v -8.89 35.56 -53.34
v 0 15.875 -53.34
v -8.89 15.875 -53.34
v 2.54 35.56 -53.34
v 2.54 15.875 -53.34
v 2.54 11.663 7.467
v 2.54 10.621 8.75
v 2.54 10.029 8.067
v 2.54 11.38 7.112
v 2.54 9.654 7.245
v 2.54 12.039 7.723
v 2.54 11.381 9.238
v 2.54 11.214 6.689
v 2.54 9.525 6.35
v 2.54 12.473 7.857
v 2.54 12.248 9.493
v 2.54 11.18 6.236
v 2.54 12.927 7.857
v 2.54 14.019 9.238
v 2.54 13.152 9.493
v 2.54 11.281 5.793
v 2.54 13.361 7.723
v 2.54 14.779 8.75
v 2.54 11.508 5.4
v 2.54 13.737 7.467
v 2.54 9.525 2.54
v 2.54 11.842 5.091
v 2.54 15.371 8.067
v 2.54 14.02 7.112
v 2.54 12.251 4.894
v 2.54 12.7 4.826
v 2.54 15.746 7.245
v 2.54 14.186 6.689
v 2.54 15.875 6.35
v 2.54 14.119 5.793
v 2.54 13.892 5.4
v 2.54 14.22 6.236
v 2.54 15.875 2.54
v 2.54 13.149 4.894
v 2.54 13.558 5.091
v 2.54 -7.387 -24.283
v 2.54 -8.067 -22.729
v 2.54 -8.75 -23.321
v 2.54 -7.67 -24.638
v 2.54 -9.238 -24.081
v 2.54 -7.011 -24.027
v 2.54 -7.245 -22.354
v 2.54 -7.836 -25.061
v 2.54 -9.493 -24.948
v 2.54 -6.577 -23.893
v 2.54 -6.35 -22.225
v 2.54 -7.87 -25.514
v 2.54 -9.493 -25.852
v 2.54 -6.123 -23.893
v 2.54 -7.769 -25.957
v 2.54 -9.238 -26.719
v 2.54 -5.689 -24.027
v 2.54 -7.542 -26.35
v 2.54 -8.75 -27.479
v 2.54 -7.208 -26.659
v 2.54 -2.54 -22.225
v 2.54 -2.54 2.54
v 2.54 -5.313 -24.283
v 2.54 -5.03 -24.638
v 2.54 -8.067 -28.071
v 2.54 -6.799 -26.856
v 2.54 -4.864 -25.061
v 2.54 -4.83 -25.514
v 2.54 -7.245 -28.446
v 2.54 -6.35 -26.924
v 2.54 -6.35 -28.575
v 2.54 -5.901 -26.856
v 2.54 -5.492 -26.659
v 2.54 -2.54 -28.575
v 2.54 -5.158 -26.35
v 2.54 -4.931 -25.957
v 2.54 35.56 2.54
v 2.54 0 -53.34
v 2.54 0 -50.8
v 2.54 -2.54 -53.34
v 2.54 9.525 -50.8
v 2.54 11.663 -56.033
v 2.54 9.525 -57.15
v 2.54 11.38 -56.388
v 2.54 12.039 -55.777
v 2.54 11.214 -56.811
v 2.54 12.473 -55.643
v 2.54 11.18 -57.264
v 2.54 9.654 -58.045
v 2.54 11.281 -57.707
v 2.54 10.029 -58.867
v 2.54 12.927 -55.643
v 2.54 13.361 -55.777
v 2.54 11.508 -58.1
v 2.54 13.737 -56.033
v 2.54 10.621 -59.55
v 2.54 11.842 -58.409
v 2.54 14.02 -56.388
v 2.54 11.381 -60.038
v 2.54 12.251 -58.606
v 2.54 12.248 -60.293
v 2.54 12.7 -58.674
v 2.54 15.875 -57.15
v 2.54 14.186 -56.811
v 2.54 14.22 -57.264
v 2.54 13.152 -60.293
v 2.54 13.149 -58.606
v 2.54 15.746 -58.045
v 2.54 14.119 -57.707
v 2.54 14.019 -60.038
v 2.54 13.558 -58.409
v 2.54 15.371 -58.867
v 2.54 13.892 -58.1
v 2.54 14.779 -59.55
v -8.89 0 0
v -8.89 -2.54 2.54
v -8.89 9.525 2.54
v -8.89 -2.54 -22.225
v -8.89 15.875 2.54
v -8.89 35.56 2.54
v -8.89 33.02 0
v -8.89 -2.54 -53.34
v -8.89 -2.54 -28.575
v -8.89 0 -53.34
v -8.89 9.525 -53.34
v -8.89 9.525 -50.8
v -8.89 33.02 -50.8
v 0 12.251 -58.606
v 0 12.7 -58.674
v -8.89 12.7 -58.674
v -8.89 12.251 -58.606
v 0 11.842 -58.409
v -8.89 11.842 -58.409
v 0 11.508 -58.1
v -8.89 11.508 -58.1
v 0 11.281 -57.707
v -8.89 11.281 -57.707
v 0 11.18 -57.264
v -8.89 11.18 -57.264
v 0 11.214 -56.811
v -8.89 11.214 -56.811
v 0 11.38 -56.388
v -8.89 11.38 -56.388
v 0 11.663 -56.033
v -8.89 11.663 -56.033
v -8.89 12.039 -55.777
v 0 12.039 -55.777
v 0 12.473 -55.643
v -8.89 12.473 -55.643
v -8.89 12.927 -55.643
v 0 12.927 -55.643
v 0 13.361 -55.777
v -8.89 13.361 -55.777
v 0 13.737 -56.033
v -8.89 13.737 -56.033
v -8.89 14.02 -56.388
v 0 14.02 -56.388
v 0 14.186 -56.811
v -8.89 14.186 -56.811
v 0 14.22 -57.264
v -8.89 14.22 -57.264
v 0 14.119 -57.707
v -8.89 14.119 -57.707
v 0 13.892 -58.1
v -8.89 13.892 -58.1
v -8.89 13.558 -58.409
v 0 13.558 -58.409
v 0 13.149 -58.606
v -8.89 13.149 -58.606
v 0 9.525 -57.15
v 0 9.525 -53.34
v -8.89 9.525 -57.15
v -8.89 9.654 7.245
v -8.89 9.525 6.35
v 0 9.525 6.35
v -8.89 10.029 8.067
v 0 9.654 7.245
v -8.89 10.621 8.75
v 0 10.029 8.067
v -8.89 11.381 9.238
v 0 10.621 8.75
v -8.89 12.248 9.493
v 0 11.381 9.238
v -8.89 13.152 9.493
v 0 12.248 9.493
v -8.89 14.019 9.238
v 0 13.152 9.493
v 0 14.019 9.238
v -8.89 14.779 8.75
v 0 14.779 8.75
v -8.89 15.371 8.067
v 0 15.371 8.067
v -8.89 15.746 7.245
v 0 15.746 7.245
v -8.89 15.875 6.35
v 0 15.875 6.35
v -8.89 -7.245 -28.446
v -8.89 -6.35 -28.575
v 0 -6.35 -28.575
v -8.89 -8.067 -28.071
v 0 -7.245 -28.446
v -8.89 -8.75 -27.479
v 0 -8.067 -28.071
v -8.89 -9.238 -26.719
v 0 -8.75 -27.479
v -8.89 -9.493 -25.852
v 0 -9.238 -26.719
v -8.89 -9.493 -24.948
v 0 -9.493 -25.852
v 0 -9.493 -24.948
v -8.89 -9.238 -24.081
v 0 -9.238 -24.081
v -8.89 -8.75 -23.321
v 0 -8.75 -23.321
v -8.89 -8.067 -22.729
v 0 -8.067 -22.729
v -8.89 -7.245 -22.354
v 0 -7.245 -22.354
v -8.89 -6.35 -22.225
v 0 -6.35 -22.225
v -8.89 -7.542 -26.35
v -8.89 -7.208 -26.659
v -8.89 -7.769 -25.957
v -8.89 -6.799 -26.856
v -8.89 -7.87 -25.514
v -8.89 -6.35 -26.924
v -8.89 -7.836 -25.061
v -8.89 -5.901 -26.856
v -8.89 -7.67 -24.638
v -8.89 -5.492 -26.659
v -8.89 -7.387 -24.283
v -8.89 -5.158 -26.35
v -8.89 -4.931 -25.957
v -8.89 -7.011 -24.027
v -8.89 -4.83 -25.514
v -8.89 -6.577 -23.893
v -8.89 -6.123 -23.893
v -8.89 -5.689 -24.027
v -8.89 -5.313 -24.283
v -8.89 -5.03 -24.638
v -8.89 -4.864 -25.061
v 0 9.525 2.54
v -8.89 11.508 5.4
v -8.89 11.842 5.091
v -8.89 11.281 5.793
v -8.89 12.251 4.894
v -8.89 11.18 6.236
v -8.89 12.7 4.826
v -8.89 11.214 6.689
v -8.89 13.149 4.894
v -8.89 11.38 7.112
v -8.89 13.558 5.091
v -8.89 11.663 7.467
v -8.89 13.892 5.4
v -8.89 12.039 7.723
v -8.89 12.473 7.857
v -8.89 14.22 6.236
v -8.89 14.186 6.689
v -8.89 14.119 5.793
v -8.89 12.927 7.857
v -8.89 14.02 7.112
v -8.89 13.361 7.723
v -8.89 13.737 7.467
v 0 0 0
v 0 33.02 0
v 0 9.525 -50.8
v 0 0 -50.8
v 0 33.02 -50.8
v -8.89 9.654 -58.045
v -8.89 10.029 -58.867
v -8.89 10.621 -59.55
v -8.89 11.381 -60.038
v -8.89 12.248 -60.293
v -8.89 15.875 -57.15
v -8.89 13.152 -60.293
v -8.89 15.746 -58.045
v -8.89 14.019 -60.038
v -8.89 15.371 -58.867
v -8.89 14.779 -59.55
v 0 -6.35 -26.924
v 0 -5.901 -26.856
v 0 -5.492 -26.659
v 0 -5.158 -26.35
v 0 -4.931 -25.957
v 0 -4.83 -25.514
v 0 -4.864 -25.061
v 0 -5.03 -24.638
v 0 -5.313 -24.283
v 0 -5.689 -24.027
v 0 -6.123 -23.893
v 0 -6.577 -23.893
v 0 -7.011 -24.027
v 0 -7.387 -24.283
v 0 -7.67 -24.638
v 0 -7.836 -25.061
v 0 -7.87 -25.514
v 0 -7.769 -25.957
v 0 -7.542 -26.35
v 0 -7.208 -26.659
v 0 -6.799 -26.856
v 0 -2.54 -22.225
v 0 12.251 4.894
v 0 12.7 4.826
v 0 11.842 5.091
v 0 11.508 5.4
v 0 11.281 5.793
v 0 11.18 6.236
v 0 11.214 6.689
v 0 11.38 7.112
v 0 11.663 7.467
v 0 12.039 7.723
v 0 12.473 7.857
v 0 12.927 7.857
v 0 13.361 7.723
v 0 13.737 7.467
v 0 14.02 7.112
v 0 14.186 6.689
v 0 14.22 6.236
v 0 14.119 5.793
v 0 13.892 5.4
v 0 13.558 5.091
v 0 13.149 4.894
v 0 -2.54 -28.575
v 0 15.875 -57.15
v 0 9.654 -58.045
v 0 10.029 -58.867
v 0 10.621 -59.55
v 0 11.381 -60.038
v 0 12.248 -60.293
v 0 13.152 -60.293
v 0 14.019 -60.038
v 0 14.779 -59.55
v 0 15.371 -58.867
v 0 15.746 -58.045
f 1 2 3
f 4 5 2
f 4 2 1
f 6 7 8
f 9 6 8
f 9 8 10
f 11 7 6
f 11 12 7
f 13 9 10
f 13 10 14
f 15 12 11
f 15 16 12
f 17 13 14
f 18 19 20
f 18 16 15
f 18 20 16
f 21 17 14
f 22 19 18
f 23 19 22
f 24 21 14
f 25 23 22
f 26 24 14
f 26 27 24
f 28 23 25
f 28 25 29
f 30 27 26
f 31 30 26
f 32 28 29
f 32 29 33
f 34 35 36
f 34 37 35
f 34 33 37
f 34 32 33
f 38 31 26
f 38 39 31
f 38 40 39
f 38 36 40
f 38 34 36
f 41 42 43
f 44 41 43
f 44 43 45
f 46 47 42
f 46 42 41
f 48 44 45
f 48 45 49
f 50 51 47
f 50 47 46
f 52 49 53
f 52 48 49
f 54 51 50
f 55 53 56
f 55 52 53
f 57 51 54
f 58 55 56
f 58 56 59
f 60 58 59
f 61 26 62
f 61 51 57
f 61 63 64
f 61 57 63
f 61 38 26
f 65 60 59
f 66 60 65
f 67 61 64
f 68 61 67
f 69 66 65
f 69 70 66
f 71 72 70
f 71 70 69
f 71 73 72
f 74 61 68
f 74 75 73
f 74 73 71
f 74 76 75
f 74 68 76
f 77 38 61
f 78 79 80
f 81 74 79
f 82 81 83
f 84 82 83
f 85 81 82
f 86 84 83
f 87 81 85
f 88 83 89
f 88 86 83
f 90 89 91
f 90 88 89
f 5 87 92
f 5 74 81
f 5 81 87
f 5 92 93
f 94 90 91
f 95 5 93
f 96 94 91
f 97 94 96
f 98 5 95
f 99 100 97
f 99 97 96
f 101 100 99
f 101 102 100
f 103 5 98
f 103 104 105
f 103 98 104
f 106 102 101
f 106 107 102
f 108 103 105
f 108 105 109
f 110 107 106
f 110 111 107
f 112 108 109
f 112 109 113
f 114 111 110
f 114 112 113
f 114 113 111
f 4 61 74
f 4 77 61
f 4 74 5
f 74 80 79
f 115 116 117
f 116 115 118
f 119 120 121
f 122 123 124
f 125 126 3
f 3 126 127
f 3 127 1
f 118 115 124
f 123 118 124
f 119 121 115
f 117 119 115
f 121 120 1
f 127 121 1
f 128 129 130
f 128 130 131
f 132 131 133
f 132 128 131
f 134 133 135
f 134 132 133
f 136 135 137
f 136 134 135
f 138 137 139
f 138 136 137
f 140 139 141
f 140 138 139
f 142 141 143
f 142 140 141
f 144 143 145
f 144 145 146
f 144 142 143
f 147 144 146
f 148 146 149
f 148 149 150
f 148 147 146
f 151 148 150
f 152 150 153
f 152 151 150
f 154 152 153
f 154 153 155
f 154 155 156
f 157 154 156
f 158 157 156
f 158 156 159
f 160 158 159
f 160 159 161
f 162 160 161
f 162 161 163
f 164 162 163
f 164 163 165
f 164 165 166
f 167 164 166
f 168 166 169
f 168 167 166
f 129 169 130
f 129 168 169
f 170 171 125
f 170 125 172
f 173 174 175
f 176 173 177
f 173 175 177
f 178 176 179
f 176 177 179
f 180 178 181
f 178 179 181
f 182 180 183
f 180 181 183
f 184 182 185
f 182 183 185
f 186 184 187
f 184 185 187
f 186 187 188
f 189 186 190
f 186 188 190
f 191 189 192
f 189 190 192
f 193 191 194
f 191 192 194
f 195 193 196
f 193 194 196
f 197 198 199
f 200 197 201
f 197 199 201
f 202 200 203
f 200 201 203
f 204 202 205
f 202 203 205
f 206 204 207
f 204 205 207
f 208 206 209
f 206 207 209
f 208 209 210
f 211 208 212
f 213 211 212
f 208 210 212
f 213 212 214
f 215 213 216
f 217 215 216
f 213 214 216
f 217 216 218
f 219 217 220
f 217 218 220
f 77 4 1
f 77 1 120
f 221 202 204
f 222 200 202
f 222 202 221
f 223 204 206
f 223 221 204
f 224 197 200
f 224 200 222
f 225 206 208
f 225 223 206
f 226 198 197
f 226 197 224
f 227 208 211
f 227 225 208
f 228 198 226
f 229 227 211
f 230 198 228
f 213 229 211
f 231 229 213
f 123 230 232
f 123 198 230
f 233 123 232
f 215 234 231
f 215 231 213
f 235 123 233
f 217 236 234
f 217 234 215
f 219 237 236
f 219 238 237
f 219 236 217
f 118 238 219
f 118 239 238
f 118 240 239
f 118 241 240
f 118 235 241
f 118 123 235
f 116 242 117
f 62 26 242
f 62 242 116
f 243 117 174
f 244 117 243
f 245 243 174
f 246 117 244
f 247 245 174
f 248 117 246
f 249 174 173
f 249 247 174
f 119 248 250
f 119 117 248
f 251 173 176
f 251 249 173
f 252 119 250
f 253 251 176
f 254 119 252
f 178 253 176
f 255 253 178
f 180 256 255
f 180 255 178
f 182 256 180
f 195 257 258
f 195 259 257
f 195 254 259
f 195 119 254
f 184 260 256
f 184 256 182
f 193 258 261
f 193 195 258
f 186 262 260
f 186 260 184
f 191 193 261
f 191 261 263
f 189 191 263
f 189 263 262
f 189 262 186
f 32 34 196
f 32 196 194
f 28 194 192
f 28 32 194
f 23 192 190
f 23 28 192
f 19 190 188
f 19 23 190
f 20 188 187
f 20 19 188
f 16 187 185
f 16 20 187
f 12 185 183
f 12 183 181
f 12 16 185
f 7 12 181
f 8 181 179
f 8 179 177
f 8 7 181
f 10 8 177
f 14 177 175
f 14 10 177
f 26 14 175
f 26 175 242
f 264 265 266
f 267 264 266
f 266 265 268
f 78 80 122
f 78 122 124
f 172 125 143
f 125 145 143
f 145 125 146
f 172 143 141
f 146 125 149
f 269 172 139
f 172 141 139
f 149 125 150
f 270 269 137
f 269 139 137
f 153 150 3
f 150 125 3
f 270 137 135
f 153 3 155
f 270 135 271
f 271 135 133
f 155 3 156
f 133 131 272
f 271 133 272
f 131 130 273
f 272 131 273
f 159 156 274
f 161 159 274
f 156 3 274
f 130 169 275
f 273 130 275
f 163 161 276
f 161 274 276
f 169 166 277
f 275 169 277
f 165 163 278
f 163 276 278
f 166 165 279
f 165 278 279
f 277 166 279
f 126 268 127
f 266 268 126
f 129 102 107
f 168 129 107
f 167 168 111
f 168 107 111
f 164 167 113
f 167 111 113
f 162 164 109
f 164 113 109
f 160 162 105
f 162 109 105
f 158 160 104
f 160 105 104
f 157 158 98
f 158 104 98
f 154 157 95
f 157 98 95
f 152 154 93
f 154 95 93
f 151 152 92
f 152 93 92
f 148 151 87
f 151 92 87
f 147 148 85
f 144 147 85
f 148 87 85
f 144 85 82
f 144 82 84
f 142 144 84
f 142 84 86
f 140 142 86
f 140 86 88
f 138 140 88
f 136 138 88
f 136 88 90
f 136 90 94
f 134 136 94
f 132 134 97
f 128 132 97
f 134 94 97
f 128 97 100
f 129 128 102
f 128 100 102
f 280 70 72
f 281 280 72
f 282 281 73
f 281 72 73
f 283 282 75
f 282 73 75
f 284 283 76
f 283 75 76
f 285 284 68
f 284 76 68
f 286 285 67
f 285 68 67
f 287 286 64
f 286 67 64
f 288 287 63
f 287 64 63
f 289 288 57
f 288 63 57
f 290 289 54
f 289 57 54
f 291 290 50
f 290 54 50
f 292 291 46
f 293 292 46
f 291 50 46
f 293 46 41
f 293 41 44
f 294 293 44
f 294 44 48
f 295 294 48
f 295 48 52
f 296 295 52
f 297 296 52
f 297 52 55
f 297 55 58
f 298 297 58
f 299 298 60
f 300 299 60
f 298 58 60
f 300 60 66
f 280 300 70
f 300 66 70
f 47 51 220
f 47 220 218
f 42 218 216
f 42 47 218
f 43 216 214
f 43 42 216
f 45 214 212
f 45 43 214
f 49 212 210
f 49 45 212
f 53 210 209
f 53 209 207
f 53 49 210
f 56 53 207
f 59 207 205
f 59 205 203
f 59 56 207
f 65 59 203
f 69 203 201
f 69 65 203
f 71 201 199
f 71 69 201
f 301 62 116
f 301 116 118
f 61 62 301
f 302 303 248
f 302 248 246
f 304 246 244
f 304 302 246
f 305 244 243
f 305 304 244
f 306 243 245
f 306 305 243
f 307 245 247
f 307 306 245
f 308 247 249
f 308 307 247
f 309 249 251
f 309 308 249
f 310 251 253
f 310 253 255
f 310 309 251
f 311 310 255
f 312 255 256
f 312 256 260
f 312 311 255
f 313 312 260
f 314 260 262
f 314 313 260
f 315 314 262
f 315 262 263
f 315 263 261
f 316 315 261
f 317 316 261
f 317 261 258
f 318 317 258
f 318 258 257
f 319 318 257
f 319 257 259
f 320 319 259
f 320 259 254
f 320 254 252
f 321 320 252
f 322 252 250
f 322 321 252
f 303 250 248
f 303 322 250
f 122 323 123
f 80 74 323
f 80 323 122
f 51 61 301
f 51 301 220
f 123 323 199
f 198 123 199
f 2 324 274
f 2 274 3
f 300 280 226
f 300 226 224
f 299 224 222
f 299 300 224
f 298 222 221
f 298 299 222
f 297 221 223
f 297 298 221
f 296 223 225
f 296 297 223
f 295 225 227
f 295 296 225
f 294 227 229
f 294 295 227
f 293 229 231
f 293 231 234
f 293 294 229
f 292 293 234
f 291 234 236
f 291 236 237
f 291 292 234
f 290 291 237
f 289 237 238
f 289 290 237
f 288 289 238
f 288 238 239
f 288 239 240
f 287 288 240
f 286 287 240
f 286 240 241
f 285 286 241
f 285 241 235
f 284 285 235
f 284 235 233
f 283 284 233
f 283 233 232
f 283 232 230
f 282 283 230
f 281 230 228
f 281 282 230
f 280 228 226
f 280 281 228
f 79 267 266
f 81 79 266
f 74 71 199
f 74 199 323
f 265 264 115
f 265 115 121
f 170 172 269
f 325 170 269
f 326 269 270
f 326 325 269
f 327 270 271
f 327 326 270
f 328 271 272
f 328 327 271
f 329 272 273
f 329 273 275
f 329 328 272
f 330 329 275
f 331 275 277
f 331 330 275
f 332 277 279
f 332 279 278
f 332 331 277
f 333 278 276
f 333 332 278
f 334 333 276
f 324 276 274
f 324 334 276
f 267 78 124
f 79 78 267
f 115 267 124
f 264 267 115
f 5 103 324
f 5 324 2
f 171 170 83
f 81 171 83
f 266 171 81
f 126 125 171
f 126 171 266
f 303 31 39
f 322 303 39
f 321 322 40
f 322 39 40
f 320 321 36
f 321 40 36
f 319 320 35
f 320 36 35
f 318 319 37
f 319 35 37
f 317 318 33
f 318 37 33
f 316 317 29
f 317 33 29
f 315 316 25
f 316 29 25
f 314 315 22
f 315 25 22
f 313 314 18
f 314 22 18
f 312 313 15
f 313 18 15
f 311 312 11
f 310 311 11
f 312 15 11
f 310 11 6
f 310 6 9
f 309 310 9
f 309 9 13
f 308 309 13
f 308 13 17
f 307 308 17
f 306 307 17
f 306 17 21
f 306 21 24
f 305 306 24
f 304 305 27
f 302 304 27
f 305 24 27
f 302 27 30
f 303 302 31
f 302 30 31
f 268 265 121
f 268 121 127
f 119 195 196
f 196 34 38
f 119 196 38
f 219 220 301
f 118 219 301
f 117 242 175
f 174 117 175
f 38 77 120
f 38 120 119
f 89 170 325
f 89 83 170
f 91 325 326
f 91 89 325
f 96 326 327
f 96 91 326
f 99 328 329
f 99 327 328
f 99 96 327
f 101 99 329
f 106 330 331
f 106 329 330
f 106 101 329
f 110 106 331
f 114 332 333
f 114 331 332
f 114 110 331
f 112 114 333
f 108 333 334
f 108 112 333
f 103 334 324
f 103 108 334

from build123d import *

# Parameters (mm, degrees)
SKETCH1_W           = 50.8
SKETCH1_H           = 33.02
BOSS_EXTRUDE1_DEPTH = 2.54
SKETCH2_R           = 3.175
SKETCH2_R_2         = 1.524
BOSS_EXTRUDE3_DEPTH = 2.54
SKETCH3_W           = 22.225
SKETCH3_H           = 2.54
SKETCH3_W_2         = 6.35
SKETCH3_W_3         = 2.54
SKETCH3_H_2         = 6.35
SKETCH3_H_3         = 17.145
SKETCH3_H_4         = 9.525
BOSS_EXTRUDE4_DEPTH = 11.43
SKETCH5_W           = 2.54
SKETCH5_H           = 9.525
CUT_EXTRUDE2_DEPTH  = 11.43
SKETCH6_R           = 1.524
BOSS_EXTRUDE7_DEPTH = 8.89


with BuildPart() as part:
    # Sketch1 → Boss-Extrude1 (new body)
    with BuildSketch(Plane(origin=(0, 0, 0), x_dir=(0, 0, -1), z_dir=(1, 0, 0))):
        with Locations((25.4, 16.51)):
            Rectangle(SKETCH1_W, SKETCH1_H)
    extrude(amount=BOSS_EXTRUDE1_DEPTH)

    # Sketch2 → Boss-Extrude3 (add)
    # profile 1 of 6: a face of its own
    with BuildSketch(Plane(origin=(2.54, 0, 0), x_dir=(0, 0, -1), z_dir=(1, 0, 0))):
        with BuildLine():
            Line((-6.35, 9.525), (0, 9.525))
            Line((0, 9.525), (0, 15.875))
            Line((0, 15.875), (-6.35, 15.875))
            ThreePointArc((-6.35, 15.875), (-4.10493597, 14.94506403), (-3.175, 12.7))
            ThreePointArc((-3.175, 12.7), (-4.10493597, 10.45493597), (-6.35, 9.525))
        make_face()
    # profile 2 of 6: a face of its own
    with BuildSketch(Plane(origin=(2.54, 0, 0), x_dir=(0, 0, -1), z_dir=(1, 0, 0))):
        with Locations((-6.35, 12.7)):
            Circle(SKETCH2_R)
        with Locations((-6.35, 12.7)):
            Circle(SKETCH2_R_2, mode=Mode.SUBTRACT)
    # profile 3 of 6: a face of its own
    with BuildSketch(Plane(origin=(2.54, 0, 0), x_dir=(0, 0, -1), z_dir=(1, 0, 0))):
        with BuildLine():
            Line((28.575, -6.35), (28.575, 0))
            Line((28.575, 0), (22.225, 0))
            Line((22.225, 0), (22.225, -6.35))
            ThreePointArc((22.225, -6.35), (25.4, -3.175), (28.575, -6.35))
        make_face()
    # profile 4 of 6: a face of its own
    with BuildSketch(Plane(origin=(2.54, 0, 0), x_dir=(0, 0, -1), z_dir=(1, 0, 0))):
        with Locations((25.4, -6.35)):
            Circle(SKETCH2_R)
        with Locations((25.4, -6.35)):
            Circle(SKETCH2_R_2, mode=Mode.SUBTRACT)
    # profile 5 of 6: a face of its own
    with BuildSketch(Plane(origin=(2.54, 0, 0), x_dir=(0, 0, -1), z_dir=(1, 0, 0))):
        with BuildLine():
            Line((50.8, 9.525), (57.15, 9.525))
            ThreePointArc((57.15, 9.525), (53.975, 12.7), (57.15, 15.875))
            Line((57.15, 15.875), (50.8, 15.875))
            Line((50.8, 15.875), (50.8, 9.525))
        make_face()
    # profile 6 of 6: a face of its own
    with BuildSketch(Plane(origin=(2.54, 0, 0), x_dir=(0, 0, -1), z_dir=(1, 0, 0))):
        with Locations((57.15, 12.7)):
            Circle(SKETCH2_R)
        with Locations((57.15, 12.7)):
            Circle(SKETCH2_R_2, mode=Mode.SUBTRACT)
    extrude(amount=-BOSS_EXTRUDE3_DEPTH)

    # Sketch3 → Boss-Extrude4 (add)
    with BuildSketch(Plane(origin=(2.54, 0, 0), x_dir=(0, 0, -1), z_dir=(1, 0, 0))):
        with Locations((39.6875, -1.27)):
            Rectangle(SKETCH3_W, SKETCH3_H)
        Polygon((22.225, 0), (0, 0), (-2.54, 0), (-2.54, -2.54), (22.225, -2.54), align=None)
        with Locations((25.4, -1.27)):
            Rectangle(SKETCH3_W_2, SKETCH3_H)
        Polygon((53.34, 9.525), (50.8, 9.525), (50.8, 0), (50.8, -2.54), (53.34, -2.54), align=None)
        with Locations((52.07, 12.7)):
            Rectangle(SKETCH3_W_3, SKETCH3_H_2)
        with Locations((52.07, 24.4475)):
            Rectangle(SKETCH3_W_3, SKETCH3_H_3)
        Polygon((50.8, 33.02), (53.34, 33.02), (53.34, 35.56), (-2.54, 35.56), (-2.54, 33.02), (0, 33.02), align=None)
        with Locations((-1.27, 24.4475)):
            Rectangle(SKETCH3_W_3, SKETCH3_H_3)
        with Locations((-1.27, 12.7)):
            Rectangle(SKETCH3_W_3, SKETCH3_H_2)
        with Locations((-1.27, 4.7625)):
            Rectangle(SKETCH3_W_3, SKETCH3_H_4)
    extrude(amount=-BOSS_EXTRUDE4_DEPTH)

    # Sketch5 → Cut-Extrude2 (cut)
    with BuildSketch(Plane.ZY.offset(8.89)):
        with Locations((-52.07, 4.7625)):
            Rectangle(SKETCH5_W, SKETCH5_H)
    extrude(amount=-CUT_EXTRUDE2_DEPTH, mode=Mode.SUBTRACT)

    # Sketch6 → Boss-Extrude7 (add)
    # profile 1 of 3: a face of its own
    with BuildSketch(Plane.ZY):
        with BuildLine():
            Line((2.54, 15.875), (2.54, 9.525))
            Line((2.54, 9.525), (6.35, 9.525))
            ThreePointArc((6.35, 9.525), (9.525, 12.7), (6.35, 15.875))
            Line((6.35, 15.875), (2.54, 15.875))
        make_face()
        with Locations(Location((6.35, 12.7, 0), (0, 0, 180))):
            Circle(SKETCH6_R, mode=Mode.SUBTRACT)
    # profile 2 of 3: a face of its own
    with BuildSketch(Plane.ZY):
        with BuildLine():
            Line((-22.225, -2.54), (-28.575, -2.54))
            Line((-28.575, -2.54), (-28.575, -6.35))
            ThreePointArc((-28.575, -6.35), (-25.4, -9.525), (-22.225, -6.35))
            Line((-22.225, -6.35), (-22.225, -2.54))
        make_face()
        with Locations(Location((-25.4, -6.35, 0), (0, 0, 180))):
            Circle(SKETCH6_R, mode=Mode.SUBTRACT)
    # profile 3 of 3: a face of its own
    with BuildSketch(Plane.ZY):
        with BuildLine():
            Line((-53.34, 15.875), (-53.34, 9.525))
            Line((-53.34, 9.525), (-57.15, 9.525))
            ThreePointArc((-57.15, 9.525), (-60.325, 12.7), (-57.15, 15.875))
            Line((-57.15, 15.875), (-53.34, 15.875))
        make_face()
        with Locations(Location((-57.15, 12.7, 0), (0, 0, 180))):
            Circle(SKETCH6_R, mode=Mode.SUBTRACT)
    extrude(amount=BOSS_EXTRUDE7_DEPTH)


solid = part.part
